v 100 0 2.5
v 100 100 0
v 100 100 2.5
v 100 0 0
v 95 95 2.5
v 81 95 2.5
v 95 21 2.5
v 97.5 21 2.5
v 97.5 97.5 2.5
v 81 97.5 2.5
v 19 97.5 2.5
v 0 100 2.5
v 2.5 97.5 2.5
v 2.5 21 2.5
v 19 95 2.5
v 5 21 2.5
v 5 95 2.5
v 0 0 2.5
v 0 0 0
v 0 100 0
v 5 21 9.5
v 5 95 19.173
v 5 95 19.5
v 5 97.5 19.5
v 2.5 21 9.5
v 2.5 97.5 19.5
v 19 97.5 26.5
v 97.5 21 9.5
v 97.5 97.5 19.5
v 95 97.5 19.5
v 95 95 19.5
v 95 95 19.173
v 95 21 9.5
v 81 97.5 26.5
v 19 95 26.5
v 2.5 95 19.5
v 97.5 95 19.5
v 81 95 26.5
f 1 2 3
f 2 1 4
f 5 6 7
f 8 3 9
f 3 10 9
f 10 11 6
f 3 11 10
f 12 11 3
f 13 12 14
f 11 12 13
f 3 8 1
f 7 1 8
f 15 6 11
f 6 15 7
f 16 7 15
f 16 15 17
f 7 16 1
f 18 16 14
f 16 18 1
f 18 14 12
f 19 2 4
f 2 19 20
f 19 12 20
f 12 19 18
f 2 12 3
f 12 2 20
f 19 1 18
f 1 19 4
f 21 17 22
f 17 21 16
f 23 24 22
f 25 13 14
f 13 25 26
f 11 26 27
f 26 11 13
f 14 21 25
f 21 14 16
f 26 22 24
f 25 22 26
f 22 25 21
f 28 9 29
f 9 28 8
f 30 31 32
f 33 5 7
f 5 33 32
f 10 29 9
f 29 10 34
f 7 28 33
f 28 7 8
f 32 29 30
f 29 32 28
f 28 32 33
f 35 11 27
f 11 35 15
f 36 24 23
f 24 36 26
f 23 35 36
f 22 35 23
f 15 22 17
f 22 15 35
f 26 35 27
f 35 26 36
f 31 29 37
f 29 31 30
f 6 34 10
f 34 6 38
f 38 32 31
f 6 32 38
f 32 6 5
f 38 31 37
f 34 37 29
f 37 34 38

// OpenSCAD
/*
 *
 * 3D-printable end cap for 100mm square-section electrical trunking
 *
 */
module prism( l, w, h ) {
       polyhedron(
               points=[[0,0,0], [l,0,0], [l,w,0], [0,w,0], [0,w,h], [l,w,h]],
               faces=[[0,1,2,3],[5,4,3,2],[0,4,5,1],[0,3,4],[5,2,1]]
               );
}
union() {
    cube( [100,100,2.5] );
    translate( [2.5,21,2.5] ) cube( [2.5,76.5,7] );
    translate( [2.5,21,9.5] ) prism( 2.5,76.5,10 );
    translate( [95,21,2.5] ) cube( [2.5,76.5,7] );
    translate( [95,21,9.5] ) prism( 2.5,76.5,10 );
    translate( [5,95,2.5] ) cube( [14,2.5,17] );
    translate( [2.5,97.5,19.5] ) rotate( 270 ) prism( 2.5,16.5,7 );
    translate( [81,95,2.5] ) cube( [14,2.5,17] );
    translate( [97.5,95,19.5] ) rotate( 90 ) prism( 2.5,16.5,7 );
}
